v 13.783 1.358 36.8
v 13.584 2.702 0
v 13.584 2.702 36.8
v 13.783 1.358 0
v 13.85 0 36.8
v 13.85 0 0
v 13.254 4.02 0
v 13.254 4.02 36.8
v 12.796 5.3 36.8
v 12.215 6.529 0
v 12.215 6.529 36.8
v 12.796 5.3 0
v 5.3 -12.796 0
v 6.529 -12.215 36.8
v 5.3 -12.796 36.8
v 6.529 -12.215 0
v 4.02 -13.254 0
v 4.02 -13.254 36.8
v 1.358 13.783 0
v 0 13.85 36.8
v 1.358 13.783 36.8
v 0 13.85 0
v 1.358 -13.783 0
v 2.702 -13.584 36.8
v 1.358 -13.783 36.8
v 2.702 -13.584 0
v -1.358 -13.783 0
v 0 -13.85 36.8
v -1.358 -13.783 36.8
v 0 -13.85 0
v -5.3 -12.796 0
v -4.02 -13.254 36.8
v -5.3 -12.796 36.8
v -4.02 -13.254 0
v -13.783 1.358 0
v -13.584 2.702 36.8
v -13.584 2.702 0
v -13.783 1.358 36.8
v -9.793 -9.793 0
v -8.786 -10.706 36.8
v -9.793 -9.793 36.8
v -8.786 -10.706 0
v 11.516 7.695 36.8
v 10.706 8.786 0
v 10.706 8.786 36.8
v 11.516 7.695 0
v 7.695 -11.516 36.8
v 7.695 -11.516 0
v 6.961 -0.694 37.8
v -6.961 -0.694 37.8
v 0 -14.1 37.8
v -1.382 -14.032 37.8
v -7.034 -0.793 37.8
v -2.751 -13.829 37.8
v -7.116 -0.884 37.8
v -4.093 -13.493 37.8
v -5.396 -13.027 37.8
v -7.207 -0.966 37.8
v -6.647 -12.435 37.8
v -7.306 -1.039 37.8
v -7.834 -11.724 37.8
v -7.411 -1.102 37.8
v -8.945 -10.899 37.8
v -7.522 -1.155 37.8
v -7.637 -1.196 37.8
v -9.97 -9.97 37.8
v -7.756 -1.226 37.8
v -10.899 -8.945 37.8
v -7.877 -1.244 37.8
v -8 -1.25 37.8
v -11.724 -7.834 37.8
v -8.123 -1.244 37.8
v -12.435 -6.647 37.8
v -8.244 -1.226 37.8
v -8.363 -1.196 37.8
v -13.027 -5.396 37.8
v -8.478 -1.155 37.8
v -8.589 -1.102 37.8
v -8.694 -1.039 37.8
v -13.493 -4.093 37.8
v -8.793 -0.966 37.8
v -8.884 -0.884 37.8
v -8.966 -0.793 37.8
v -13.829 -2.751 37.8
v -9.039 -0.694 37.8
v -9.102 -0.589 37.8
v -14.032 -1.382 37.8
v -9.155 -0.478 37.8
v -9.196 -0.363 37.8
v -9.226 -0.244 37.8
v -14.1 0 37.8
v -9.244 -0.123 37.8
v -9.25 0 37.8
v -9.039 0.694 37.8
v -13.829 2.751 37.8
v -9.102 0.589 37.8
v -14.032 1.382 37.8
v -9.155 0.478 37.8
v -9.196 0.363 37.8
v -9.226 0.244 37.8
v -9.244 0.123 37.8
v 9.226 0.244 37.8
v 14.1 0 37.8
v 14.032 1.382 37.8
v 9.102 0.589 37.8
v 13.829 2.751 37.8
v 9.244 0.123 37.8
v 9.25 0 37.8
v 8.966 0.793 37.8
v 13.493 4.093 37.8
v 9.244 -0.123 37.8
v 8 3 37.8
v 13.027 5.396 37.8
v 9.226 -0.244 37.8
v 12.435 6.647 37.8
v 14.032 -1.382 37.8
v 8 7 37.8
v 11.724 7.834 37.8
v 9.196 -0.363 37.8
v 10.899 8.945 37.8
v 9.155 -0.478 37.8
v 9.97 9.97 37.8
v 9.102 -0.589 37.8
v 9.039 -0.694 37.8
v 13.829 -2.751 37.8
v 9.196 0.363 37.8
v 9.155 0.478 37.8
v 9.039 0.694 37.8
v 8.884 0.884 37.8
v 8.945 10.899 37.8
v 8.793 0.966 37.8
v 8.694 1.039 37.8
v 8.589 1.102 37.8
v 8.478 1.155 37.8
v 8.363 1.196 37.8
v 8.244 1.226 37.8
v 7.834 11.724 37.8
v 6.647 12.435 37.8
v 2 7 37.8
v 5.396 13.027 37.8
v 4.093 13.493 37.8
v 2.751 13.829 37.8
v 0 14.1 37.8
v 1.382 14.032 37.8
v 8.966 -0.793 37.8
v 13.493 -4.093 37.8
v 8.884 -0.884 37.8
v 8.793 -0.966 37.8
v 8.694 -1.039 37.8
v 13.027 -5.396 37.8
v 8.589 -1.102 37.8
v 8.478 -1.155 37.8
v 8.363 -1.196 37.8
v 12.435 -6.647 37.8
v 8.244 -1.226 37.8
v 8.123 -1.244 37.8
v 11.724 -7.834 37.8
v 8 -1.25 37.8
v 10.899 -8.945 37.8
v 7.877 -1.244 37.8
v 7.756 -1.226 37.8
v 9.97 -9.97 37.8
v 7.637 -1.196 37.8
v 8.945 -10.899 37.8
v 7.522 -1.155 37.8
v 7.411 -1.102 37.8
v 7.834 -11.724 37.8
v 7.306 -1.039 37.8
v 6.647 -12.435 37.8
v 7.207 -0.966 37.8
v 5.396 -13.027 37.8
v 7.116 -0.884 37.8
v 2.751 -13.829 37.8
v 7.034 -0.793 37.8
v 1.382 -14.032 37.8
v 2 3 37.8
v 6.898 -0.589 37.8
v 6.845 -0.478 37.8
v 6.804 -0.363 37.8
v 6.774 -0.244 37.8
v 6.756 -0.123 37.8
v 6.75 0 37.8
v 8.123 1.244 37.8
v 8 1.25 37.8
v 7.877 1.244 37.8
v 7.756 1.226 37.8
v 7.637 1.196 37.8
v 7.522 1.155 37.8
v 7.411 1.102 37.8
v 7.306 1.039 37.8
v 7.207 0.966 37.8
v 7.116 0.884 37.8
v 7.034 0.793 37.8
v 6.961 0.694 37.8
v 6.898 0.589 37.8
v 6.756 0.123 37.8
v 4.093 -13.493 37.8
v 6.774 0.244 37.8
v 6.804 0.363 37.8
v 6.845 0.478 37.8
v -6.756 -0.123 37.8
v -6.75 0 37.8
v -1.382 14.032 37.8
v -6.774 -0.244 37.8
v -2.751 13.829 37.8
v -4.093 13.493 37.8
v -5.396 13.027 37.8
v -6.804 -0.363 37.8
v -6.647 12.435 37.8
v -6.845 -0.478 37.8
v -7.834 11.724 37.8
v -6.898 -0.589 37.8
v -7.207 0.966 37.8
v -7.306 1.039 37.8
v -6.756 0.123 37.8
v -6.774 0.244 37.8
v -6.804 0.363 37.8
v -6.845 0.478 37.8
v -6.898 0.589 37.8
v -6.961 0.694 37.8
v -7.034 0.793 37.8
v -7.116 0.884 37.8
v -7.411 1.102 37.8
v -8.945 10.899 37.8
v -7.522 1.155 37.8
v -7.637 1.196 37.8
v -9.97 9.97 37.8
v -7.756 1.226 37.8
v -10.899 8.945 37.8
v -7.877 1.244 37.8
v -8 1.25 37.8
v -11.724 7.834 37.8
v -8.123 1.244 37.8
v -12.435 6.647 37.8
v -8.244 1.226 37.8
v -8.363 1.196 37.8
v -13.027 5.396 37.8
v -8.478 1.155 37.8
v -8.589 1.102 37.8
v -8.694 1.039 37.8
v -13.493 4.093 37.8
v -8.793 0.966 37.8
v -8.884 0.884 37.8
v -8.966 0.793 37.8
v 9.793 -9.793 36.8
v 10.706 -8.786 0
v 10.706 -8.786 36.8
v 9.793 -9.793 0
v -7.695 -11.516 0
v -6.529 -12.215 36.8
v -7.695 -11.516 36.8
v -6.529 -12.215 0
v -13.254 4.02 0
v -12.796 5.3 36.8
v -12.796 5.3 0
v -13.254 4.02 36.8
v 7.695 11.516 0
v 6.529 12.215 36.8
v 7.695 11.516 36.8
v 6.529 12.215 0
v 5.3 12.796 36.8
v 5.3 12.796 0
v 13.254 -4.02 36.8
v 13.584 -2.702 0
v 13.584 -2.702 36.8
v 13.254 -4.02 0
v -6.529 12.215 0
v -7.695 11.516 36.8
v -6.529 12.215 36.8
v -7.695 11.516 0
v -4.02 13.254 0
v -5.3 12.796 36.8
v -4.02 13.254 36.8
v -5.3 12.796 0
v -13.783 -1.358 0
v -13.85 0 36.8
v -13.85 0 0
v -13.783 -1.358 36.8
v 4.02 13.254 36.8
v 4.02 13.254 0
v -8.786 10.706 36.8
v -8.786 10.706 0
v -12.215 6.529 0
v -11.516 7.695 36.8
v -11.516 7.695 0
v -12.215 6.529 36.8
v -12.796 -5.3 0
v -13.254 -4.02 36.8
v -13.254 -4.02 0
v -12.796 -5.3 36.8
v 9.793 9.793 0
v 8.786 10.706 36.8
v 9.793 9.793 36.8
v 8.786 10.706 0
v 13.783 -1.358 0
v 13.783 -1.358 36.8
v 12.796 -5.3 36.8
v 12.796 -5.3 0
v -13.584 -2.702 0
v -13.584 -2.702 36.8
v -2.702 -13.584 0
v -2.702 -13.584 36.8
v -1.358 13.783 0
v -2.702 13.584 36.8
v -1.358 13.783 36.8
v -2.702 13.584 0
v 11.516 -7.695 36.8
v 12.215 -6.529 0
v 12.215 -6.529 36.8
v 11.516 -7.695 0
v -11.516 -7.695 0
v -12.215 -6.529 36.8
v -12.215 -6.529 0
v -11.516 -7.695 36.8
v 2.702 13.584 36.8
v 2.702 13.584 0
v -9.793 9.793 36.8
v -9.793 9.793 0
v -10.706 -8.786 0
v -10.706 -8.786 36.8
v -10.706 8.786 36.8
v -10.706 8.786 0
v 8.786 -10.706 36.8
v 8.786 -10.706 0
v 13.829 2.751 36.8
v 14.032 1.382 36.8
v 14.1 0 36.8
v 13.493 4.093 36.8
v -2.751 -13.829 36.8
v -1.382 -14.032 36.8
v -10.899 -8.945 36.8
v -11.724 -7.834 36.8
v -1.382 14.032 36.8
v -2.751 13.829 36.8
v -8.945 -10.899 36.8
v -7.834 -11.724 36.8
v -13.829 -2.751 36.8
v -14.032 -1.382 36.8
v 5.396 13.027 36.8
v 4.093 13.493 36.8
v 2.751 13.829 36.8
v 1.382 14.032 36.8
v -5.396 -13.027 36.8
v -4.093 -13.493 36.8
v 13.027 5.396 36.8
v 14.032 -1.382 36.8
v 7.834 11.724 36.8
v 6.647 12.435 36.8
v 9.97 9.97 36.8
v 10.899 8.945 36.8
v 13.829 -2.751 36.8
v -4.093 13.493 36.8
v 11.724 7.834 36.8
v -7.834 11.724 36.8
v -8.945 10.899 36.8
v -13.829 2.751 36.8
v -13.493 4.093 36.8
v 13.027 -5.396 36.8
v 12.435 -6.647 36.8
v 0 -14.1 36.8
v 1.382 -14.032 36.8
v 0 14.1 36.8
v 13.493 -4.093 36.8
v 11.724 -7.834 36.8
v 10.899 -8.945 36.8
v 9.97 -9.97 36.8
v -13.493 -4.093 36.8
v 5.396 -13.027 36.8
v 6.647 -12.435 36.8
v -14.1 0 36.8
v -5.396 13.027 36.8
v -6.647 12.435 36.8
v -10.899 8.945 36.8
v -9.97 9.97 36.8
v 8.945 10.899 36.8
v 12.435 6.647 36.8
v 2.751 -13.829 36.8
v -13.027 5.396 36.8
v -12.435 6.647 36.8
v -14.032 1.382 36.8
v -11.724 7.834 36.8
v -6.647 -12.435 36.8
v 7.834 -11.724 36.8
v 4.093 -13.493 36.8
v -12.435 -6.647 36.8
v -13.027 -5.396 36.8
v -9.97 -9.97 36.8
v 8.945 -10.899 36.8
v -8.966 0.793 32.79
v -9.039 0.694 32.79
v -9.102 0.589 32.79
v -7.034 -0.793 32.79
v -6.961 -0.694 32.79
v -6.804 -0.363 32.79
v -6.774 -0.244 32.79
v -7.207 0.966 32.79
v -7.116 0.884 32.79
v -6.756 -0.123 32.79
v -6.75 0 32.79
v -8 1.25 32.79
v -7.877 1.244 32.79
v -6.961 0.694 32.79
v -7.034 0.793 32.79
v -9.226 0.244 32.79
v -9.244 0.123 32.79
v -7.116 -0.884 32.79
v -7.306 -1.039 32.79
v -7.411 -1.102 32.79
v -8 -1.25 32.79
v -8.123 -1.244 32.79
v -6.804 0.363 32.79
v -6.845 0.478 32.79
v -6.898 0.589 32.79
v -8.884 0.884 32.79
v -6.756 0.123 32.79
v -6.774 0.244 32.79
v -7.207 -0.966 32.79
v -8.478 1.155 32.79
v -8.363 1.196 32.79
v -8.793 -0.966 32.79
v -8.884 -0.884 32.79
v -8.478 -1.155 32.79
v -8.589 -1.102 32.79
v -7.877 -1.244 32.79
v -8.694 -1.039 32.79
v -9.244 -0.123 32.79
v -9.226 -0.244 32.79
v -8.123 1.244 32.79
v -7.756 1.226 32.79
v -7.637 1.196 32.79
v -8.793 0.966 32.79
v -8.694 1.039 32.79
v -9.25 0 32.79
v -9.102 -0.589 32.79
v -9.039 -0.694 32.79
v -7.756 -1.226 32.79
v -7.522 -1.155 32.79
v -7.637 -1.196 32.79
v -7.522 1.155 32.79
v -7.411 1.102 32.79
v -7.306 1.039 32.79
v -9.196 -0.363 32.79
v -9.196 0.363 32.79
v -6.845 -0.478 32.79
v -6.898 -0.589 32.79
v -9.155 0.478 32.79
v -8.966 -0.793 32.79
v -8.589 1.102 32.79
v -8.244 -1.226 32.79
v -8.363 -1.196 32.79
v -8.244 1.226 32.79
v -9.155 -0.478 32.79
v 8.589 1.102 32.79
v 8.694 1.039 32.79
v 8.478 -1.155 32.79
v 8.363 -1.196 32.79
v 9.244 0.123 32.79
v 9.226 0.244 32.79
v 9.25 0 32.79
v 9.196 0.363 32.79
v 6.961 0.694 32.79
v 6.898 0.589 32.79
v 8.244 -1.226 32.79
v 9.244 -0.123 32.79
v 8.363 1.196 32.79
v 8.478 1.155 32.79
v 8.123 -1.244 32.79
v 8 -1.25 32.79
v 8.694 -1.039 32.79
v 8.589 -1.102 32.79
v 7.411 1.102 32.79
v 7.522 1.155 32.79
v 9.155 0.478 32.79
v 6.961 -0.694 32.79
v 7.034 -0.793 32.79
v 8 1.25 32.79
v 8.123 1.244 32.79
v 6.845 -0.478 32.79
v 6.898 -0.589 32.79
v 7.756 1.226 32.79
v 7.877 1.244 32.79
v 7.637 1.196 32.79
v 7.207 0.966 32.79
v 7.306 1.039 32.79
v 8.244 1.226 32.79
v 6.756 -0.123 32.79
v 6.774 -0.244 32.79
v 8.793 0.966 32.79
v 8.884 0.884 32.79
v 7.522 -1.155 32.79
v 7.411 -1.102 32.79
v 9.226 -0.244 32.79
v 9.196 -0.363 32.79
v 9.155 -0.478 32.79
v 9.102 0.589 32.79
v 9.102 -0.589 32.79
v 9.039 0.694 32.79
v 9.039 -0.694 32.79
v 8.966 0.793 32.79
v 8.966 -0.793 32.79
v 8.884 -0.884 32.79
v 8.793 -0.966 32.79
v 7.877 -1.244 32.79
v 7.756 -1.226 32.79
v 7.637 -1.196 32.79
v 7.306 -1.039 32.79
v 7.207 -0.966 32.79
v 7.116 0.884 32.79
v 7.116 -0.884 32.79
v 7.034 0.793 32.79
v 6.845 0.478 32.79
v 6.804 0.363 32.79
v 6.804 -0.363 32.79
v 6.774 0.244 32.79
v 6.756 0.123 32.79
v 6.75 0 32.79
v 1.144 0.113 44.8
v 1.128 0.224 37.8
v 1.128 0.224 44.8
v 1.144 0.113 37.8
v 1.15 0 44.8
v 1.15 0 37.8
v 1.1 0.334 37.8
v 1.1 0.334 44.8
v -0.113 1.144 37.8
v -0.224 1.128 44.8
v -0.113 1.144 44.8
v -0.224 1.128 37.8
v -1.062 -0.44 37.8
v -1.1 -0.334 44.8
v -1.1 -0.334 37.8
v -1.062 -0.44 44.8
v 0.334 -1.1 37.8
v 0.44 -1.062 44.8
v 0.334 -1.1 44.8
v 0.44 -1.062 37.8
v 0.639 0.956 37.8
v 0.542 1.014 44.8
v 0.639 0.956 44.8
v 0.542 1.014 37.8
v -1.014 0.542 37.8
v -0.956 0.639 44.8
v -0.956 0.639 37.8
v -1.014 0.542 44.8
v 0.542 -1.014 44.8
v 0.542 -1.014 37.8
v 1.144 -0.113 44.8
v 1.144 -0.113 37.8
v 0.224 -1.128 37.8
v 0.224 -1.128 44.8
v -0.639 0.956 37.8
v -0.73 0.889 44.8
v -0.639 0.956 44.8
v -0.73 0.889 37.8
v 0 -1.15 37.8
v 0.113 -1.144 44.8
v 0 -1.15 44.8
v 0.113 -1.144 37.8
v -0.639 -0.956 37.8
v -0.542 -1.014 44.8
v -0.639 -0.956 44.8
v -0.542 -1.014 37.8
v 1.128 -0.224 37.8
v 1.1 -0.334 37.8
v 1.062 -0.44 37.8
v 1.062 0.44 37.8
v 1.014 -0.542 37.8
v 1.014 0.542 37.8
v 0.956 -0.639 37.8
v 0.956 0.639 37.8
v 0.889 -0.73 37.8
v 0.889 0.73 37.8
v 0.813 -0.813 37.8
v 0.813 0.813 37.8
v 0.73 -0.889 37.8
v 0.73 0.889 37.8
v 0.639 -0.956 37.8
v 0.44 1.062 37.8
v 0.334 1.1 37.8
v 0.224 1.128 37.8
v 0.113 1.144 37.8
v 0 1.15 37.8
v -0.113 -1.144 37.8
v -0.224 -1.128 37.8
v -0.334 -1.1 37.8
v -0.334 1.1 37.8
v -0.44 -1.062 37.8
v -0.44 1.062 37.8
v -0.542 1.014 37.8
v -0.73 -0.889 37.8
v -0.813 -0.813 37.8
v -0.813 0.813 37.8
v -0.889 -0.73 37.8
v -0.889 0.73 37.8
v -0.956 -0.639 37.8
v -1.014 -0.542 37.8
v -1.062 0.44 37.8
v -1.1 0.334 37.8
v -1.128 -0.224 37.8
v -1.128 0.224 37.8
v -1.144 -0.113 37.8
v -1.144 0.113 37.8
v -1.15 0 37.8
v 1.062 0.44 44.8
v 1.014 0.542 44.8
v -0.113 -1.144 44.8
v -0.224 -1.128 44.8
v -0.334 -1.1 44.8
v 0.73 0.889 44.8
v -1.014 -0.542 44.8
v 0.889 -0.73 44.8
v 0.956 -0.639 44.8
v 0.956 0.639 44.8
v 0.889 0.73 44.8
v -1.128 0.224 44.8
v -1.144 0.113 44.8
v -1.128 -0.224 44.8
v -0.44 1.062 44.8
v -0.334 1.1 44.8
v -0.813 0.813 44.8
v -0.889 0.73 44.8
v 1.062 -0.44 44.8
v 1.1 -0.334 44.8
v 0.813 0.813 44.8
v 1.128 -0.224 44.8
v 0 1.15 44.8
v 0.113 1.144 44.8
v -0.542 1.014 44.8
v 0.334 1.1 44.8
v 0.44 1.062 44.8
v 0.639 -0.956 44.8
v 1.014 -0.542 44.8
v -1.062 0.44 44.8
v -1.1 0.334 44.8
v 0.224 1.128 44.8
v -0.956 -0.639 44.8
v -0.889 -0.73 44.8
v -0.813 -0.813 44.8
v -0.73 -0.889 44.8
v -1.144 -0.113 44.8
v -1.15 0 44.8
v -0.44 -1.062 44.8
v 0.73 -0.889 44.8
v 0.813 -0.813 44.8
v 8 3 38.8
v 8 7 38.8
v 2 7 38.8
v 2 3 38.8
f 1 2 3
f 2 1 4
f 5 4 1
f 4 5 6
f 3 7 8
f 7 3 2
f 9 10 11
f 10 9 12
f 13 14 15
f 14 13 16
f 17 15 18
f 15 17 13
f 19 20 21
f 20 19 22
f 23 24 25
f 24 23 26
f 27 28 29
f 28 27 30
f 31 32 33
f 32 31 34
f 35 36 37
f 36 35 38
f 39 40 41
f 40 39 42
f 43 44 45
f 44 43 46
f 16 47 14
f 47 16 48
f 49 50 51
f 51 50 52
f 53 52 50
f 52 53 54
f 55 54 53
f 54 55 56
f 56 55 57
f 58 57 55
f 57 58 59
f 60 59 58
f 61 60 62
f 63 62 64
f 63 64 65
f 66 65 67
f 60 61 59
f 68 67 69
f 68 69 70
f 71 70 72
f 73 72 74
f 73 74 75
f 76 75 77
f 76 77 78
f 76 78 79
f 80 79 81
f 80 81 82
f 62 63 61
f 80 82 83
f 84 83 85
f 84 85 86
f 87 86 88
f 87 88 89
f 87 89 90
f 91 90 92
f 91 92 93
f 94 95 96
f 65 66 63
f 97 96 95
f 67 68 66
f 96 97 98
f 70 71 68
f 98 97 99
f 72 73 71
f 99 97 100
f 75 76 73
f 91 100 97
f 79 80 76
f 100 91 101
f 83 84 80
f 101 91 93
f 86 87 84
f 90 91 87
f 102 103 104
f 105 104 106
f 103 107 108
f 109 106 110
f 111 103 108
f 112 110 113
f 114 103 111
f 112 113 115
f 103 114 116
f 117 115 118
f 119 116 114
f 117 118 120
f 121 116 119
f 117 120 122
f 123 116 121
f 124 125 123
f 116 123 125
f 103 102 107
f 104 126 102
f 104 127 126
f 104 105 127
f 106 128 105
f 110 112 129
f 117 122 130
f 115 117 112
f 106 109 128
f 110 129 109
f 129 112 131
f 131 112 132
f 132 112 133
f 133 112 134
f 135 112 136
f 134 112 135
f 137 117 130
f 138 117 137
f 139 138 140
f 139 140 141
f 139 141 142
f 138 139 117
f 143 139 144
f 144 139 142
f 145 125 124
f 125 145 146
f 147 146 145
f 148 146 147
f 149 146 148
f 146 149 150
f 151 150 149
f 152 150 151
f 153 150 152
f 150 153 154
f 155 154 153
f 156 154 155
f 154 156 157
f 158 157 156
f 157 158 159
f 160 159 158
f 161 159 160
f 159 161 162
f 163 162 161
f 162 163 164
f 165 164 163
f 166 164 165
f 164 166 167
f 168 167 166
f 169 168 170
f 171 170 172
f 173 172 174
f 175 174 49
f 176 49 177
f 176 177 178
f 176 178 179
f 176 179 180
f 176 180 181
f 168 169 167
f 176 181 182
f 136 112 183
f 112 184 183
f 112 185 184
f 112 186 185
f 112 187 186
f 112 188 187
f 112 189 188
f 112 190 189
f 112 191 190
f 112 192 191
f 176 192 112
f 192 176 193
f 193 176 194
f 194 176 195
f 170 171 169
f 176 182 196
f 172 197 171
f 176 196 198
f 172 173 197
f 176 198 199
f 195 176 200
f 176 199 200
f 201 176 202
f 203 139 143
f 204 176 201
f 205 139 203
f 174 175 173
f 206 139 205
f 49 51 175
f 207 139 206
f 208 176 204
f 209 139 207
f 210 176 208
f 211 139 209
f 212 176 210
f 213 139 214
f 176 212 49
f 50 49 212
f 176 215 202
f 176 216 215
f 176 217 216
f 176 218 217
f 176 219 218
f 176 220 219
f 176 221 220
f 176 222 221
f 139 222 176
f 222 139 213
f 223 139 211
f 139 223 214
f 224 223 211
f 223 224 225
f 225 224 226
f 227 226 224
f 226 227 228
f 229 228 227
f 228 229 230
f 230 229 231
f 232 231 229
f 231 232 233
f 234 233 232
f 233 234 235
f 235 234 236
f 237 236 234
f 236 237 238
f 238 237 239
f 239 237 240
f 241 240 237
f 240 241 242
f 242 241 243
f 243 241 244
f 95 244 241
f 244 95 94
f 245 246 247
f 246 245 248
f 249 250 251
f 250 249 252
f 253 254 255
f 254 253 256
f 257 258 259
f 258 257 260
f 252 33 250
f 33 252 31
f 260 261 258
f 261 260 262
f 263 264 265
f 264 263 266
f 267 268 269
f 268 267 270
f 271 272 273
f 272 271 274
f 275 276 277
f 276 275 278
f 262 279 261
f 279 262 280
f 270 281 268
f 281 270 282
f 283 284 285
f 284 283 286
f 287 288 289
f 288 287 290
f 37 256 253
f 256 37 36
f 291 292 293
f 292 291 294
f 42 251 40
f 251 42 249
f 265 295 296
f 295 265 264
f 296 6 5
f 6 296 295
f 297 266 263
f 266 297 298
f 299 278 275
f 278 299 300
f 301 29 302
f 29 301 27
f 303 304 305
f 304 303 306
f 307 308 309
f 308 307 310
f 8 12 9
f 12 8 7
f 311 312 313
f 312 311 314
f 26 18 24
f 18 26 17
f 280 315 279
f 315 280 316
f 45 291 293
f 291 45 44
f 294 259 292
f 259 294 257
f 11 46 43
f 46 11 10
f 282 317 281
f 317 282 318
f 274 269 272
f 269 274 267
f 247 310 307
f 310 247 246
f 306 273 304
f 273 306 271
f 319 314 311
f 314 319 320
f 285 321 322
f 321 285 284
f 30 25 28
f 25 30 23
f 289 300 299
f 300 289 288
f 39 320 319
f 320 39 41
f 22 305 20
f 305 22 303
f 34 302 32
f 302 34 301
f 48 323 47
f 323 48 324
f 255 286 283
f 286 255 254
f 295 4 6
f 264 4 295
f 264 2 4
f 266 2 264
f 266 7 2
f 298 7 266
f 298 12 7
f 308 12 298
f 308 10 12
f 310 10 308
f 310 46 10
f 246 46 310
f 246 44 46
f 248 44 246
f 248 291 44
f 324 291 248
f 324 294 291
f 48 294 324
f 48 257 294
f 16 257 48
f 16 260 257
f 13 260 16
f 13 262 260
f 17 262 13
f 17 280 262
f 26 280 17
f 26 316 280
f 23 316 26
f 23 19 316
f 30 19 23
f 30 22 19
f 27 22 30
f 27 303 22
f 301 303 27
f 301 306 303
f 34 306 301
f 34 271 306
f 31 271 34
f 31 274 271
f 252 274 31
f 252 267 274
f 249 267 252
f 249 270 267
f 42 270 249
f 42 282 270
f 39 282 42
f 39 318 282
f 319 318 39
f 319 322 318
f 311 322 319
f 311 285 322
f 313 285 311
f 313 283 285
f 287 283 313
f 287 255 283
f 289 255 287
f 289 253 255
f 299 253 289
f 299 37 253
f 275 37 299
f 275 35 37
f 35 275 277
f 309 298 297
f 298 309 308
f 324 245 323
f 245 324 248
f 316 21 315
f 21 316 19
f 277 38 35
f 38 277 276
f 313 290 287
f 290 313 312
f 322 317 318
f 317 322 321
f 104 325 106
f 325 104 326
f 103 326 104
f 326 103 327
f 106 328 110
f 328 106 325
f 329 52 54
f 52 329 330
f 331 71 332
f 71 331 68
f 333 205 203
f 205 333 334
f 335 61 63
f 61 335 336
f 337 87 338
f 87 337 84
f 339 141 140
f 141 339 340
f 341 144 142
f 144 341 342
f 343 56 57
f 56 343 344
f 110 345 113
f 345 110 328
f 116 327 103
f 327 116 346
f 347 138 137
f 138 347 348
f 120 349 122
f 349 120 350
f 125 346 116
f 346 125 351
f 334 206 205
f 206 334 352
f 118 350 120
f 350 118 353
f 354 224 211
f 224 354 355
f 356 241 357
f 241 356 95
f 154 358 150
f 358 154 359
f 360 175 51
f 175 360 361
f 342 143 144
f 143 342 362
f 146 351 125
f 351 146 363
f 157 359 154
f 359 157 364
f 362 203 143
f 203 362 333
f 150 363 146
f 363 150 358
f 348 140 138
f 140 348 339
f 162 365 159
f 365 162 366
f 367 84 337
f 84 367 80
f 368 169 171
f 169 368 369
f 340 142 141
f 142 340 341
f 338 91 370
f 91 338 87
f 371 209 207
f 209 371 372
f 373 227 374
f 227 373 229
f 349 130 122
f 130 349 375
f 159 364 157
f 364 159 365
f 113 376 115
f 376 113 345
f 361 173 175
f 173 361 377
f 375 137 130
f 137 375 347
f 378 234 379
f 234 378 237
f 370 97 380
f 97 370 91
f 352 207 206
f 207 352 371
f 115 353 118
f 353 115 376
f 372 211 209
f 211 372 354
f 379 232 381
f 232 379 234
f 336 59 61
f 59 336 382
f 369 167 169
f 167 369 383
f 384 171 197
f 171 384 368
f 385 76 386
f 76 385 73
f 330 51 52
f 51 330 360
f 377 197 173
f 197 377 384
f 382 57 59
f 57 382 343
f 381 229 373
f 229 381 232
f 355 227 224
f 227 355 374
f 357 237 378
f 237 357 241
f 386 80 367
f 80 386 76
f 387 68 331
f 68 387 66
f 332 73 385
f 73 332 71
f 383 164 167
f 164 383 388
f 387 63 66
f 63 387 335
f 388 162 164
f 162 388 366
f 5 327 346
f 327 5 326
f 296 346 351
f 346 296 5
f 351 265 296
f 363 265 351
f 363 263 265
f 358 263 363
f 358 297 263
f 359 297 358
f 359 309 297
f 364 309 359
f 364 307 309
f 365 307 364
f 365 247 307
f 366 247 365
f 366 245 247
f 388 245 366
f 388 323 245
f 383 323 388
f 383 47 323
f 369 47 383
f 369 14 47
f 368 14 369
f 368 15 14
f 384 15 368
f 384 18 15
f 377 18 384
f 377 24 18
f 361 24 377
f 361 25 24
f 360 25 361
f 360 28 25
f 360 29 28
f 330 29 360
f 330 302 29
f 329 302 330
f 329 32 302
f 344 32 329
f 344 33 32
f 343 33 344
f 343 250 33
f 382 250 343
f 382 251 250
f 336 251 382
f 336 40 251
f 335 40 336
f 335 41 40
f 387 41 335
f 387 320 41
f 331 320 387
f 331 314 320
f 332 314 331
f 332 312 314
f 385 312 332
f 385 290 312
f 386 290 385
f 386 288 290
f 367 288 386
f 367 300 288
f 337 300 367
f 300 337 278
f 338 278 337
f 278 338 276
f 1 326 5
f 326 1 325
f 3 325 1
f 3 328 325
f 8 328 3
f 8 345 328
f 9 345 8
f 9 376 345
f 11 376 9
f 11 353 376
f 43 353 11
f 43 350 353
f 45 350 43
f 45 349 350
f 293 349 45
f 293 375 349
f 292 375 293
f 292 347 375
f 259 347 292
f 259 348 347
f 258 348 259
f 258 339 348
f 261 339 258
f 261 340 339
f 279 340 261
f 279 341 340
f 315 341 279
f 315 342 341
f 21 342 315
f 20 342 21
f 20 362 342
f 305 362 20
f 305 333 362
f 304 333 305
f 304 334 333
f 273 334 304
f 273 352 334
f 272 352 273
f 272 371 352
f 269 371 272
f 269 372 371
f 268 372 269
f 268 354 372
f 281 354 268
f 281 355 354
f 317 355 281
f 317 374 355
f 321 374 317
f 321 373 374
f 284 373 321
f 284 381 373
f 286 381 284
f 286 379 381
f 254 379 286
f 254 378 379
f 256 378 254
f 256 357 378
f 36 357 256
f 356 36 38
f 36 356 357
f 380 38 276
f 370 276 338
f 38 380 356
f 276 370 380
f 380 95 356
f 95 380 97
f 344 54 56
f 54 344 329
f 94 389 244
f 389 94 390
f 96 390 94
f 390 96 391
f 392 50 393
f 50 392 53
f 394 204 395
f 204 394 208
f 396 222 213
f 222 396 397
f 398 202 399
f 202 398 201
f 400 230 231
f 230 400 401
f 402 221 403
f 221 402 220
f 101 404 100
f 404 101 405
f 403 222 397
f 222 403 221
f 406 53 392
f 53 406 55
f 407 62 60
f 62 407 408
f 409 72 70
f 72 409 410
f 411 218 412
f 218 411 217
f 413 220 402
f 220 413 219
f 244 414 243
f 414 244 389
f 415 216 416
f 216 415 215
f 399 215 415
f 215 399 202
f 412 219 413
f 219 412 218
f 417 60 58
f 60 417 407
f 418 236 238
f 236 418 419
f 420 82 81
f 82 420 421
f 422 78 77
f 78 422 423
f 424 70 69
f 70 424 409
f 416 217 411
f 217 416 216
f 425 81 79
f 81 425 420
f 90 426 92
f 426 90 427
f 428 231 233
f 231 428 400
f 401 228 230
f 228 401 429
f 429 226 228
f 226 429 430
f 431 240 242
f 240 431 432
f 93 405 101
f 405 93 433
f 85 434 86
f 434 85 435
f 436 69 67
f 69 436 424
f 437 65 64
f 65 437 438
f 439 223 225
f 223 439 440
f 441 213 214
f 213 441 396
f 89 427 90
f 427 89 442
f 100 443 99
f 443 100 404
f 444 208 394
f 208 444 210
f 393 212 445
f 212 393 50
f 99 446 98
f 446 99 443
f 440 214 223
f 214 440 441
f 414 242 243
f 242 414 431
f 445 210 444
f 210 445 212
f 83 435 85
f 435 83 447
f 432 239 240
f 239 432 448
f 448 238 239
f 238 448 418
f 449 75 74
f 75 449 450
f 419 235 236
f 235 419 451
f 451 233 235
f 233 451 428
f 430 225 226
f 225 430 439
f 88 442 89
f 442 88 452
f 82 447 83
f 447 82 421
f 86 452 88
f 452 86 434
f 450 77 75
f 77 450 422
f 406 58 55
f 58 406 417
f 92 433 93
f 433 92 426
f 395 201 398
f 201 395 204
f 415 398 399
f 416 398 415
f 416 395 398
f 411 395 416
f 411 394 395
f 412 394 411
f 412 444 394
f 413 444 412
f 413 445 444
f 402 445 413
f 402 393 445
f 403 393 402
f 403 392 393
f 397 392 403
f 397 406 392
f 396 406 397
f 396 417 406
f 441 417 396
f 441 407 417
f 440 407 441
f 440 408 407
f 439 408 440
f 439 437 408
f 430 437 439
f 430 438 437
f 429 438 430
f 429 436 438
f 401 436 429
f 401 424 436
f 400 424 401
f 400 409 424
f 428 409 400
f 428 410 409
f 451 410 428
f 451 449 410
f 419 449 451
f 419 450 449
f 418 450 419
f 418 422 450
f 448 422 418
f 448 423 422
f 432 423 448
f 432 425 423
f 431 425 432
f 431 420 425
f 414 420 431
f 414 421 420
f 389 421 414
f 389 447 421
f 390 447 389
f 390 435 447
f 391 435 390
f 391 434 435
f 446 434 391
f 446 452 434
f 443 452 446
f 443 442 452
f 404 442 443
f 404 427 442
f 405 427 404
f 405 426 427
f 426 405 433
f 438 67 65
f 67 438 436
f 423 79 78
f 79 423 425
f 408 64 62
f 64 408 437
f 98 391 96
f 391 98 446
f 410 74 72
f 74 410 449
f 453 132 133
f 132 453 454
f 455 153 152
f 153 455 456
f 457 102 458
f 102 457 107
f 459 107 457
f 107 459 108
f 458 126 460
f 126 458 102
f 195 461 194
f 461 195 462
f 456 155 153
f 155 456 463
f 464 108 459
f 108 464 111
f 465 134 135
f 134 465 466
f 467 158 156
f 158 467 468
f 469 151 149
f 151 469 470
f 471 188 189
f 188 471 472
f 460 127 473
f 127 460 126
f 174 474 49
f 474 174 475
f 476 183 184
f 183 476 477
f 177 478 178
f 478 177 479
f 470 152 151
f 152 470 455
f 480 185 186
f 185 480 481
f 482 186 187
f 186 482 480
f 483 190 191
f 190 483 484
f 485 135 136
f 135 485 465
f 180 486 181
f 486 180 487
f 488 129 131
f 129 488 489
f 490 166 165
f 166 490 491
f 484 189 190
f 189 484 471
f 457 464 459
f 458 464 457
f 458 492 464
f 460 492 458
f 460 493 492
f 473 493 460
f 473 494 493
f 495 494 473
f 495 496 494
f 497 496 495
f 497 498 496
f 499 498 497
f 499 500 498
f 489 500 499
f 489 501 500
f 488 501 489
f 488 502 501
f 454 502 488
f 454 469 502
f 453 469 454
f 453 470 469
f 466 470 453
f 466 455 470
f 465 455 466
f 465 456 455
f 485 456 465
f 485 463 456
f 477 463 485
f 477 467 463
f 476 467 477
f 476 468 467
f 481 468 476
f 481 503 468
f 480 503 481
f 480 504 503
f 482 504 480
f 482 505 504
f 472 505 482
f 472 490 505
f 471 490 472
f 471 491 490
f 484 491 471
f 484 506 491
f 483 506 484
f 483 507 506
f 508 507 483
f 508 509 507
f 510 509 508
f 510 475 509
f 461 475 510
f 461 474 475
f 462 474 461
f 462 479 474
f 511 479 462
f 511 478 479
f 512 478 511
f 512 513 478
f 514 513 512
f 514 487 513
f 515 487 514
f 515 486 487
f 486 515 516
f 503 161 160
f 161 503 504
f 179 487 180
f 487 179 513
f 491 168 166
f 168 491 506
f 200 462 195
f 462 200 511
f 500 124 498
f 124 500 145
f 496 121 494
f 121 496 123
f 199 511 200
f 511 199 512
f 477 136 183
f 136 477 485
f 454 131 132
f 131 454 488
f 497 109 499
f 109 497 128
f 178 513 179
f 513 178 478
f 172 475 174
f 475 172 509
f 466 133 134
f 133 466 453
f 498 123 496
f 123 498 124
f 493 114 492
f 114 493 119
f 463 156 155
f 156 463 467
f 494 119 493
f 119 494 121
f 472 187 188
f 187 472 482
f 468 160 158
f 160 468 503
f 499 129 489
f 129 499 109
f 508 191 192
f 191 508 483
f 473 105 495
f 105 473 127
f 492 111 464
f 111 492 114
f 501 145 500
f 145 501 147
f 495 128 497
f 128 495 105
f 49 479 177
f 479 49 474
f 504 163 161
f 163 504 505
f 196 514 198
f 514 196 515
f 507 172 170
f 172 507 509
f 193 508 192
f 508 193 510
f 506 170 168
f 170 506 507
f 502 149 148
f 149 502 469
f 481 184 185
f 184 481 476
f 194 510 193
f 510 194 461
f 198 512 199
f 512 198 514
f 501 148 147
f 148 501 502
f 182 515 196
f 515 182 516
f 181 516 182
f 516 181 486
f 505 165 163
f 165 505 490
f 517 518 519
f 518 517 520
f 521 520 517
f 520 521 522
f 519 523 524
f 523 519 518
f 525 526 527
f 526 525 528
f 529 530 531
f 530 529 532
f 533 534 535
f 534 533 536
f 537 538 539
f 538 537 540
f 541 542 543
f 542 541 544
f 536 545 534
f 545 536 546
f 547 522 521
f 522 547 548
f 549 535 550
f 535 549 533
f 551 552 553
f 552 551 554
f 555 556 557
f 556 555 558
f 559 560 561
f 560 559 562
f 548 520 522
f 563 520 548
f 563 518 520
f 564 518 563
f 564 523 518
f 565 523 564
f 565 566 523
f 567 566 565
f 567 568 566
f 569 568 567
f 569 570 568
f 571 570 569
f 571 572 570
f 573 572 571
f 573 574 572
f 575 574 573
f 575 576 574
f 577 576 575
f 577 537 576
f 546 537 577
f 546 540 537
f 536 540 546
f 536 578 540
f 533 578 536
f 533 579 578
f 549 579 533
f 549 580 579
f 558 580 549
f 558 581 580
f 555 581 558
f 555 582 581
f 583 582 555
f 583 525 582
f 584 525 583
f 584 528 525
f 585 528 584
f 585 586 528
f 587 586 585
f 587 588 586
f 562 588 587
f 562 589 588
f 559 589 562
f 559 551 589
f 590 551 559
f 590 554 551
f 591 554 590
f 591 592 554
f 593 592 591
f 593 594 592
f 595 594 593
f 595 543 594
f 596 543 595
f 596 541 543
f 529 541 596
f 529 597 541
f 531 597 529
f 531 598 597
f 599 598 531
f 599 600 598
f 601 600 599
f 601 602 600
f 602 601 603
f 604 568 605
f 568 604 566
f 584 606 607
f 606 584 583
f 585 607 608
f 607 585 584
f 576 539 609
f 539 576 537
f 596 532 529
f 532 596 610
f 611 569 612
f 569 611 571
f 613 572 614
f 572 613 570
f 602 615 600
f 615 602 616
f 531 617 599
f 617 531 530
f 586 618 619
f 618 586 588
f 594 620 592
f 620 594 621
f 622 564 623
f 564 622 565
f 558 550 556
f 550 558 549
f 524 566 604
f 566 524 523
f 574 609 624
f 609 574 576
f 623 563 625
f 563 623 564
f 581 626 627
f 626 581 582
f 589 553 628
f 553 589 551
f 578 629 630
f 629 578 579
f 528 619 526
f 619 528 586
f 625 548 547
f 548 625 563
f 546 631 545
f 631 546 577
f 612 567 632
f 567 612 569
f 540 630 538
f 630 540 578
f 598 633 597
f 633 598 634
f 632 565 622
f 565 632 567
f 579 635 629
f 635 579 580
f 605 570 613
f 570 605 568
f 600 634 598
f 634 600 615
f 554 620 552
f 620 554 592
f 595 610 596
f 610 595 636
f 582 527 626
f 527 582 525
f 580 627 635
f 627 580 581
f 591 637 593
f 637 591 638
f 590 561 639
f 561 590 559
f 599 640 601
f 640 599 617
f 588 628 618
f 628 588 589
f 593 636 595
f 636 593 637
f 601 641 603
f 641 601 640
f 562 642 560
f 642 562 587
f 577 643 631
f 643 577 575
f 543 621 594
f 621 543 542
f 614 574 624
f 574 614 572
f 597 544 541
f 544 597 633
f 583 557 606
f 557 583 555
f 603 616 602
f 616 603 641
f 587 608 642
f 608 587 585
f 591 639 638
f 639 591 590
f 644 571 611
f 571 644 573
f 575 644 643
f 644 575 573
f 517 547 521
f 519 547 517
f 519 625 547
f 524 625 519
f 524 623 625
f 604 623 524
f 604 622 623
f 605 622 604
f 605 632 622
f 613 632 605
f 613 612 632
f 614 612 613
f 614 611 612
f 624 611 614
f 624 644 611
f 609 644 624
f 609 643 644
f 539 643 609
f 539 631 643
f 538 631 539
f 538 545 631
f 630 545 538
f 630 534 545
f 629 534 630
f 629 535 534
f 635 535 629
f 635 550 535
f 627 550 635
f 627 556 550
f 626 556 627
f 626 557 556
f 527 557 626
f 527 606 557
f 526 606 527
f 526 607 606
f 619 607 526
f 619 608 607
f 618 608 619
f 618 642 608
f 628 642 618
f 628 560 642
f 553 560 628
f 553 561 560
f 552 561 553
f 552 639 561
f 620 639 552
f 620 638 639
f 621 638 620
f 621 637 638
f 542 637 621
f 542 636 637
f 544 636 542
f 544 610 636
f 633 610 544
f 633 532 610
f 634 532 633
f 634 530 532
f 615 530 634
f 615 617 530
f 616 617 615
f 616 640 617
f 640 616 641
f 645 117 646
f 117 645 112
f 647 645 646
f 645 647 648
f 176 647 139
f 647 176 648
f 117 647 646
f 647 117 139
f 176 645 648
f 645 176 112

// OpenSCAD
// RS385 DC Motor — parametric model (mop spin motor for OOMWOO)
// ===============================================================
// Source: Foneacc Motor datasheet (+ multiple vendor cross-refs)
//   - Shell stator: Φ27.7 × L 37.8 mm
//   - Shaft: Φ2.3 mm, single D-shape (length configurable)
//   - Mounting: M2.5 screw holes on ~16 mm pitch
//   - Used for: 2x mop spin motors (mop motor assembly)
//   - Provenance: fits Dreame L10s/Roborock S8 class mop modules
// ===============================================================
// Status: DRAFT — dimensions from datasheet, UNVERIFIED against real part.
// See MEASURE-ME.md for caliper checks needed before relying on fit.

/* [Dimensions — verify against real part] */
motor_body_d   = 27.7;    // body outer diameter (mm)
motor_body_l   = 37.8;    // body length incl. rear cap (mm)
shaft_d        = 2.3;     // shaft diameter (mm)
shaft_l        = 15.0;    // shaft length from body face (mm)
shaft_flat_l   = 8.0;     // D-flat length along shaft (mm)
shaft_flat_d   = 1.8;     // D-flat depth (dist from shaft center to flat) 
screw_d        = 2.5;     // mounting screw thread (M2.5)
screw_pitch    = 16.0;    // mounting screw center-to-center (mm)
screw_depth    = 4.0;     // screw hole depth from face (mm)

// Wire exit — approximate; measure actual
wire_exit_x    = 5.0;     // offset from center (mm)
wire_exit_y    = 5.0;

/* [Render] */
$fn = 64;

module rs385_body() {
    color("DarkSlateGray") {
        // Main can
        cylinder(d=motor_body_d, h=motor_body_l);
    }
}

module rs385_shaft() {
    color("Silver") {
        // Cylindrical shaft
        cylinder(d=shaft_d, h=shaft_l);
    }
}

module rs385_mounting_holes() {
    // Face on the front (shaft side) — 2 screw holes
    // Widely assumed M2.5 tapped, verify real part
    separation = screw_pitch;
    for (x = [-separation/2, separation/2]) {
        translate([x, 0, 0])
            cylinder(d=screw_d, h=10, center=true);
    }
}

module rs385_wire_exit() {
    // Wire exit notch — rough estimate, measure real part
    color("Black")
        translate([wire_exit_x, wire_exit_y, motor_body_l])
            cube([6, 4, 2], center=true);
}

module rs385_d_shaft() {
    // D-shaft approximation
    difference() {
        rs385_shaft();
        // Flat cut
        translate([-shaft_d, -shaft_d, shaft_l - shaft_flat_l])
            cube([shaft_d*2, shaft_d*2, shaft_flat_l + 1]);
    }
}

// Combined assembly
module rs385_motor() {
    body();
}

module body() {
    difference() {
        union() {
            rs385_body();
            // Small rear cap detail
            translate([0, 0, motor_body_l - 1])
                cylinder(d=motor_body_d + 0.5, h=1);
        }
        // Cut mounting holes (typically on front face)
        translate([0, 0, motor_body_l - 0.01])
            rs385_mounting_holes();
    }
    // Shaft protruding from front face
    translate([0, 0, motor_body_l])
        rs385_d_shaft();
    // Wire exit (rear)
    rs385_wire_exit();
}

// Render standalone
rs385_motor();

// Echo summary to console
echo("RS385 motor:", motor_body_d, "x", motor_body_l, "mm, shaft Φ", shaft_d, "x", shaft_l, "mm");
echo("Mounting holes: M", screw_d, "at", screw_pitch, "mm pitch");
